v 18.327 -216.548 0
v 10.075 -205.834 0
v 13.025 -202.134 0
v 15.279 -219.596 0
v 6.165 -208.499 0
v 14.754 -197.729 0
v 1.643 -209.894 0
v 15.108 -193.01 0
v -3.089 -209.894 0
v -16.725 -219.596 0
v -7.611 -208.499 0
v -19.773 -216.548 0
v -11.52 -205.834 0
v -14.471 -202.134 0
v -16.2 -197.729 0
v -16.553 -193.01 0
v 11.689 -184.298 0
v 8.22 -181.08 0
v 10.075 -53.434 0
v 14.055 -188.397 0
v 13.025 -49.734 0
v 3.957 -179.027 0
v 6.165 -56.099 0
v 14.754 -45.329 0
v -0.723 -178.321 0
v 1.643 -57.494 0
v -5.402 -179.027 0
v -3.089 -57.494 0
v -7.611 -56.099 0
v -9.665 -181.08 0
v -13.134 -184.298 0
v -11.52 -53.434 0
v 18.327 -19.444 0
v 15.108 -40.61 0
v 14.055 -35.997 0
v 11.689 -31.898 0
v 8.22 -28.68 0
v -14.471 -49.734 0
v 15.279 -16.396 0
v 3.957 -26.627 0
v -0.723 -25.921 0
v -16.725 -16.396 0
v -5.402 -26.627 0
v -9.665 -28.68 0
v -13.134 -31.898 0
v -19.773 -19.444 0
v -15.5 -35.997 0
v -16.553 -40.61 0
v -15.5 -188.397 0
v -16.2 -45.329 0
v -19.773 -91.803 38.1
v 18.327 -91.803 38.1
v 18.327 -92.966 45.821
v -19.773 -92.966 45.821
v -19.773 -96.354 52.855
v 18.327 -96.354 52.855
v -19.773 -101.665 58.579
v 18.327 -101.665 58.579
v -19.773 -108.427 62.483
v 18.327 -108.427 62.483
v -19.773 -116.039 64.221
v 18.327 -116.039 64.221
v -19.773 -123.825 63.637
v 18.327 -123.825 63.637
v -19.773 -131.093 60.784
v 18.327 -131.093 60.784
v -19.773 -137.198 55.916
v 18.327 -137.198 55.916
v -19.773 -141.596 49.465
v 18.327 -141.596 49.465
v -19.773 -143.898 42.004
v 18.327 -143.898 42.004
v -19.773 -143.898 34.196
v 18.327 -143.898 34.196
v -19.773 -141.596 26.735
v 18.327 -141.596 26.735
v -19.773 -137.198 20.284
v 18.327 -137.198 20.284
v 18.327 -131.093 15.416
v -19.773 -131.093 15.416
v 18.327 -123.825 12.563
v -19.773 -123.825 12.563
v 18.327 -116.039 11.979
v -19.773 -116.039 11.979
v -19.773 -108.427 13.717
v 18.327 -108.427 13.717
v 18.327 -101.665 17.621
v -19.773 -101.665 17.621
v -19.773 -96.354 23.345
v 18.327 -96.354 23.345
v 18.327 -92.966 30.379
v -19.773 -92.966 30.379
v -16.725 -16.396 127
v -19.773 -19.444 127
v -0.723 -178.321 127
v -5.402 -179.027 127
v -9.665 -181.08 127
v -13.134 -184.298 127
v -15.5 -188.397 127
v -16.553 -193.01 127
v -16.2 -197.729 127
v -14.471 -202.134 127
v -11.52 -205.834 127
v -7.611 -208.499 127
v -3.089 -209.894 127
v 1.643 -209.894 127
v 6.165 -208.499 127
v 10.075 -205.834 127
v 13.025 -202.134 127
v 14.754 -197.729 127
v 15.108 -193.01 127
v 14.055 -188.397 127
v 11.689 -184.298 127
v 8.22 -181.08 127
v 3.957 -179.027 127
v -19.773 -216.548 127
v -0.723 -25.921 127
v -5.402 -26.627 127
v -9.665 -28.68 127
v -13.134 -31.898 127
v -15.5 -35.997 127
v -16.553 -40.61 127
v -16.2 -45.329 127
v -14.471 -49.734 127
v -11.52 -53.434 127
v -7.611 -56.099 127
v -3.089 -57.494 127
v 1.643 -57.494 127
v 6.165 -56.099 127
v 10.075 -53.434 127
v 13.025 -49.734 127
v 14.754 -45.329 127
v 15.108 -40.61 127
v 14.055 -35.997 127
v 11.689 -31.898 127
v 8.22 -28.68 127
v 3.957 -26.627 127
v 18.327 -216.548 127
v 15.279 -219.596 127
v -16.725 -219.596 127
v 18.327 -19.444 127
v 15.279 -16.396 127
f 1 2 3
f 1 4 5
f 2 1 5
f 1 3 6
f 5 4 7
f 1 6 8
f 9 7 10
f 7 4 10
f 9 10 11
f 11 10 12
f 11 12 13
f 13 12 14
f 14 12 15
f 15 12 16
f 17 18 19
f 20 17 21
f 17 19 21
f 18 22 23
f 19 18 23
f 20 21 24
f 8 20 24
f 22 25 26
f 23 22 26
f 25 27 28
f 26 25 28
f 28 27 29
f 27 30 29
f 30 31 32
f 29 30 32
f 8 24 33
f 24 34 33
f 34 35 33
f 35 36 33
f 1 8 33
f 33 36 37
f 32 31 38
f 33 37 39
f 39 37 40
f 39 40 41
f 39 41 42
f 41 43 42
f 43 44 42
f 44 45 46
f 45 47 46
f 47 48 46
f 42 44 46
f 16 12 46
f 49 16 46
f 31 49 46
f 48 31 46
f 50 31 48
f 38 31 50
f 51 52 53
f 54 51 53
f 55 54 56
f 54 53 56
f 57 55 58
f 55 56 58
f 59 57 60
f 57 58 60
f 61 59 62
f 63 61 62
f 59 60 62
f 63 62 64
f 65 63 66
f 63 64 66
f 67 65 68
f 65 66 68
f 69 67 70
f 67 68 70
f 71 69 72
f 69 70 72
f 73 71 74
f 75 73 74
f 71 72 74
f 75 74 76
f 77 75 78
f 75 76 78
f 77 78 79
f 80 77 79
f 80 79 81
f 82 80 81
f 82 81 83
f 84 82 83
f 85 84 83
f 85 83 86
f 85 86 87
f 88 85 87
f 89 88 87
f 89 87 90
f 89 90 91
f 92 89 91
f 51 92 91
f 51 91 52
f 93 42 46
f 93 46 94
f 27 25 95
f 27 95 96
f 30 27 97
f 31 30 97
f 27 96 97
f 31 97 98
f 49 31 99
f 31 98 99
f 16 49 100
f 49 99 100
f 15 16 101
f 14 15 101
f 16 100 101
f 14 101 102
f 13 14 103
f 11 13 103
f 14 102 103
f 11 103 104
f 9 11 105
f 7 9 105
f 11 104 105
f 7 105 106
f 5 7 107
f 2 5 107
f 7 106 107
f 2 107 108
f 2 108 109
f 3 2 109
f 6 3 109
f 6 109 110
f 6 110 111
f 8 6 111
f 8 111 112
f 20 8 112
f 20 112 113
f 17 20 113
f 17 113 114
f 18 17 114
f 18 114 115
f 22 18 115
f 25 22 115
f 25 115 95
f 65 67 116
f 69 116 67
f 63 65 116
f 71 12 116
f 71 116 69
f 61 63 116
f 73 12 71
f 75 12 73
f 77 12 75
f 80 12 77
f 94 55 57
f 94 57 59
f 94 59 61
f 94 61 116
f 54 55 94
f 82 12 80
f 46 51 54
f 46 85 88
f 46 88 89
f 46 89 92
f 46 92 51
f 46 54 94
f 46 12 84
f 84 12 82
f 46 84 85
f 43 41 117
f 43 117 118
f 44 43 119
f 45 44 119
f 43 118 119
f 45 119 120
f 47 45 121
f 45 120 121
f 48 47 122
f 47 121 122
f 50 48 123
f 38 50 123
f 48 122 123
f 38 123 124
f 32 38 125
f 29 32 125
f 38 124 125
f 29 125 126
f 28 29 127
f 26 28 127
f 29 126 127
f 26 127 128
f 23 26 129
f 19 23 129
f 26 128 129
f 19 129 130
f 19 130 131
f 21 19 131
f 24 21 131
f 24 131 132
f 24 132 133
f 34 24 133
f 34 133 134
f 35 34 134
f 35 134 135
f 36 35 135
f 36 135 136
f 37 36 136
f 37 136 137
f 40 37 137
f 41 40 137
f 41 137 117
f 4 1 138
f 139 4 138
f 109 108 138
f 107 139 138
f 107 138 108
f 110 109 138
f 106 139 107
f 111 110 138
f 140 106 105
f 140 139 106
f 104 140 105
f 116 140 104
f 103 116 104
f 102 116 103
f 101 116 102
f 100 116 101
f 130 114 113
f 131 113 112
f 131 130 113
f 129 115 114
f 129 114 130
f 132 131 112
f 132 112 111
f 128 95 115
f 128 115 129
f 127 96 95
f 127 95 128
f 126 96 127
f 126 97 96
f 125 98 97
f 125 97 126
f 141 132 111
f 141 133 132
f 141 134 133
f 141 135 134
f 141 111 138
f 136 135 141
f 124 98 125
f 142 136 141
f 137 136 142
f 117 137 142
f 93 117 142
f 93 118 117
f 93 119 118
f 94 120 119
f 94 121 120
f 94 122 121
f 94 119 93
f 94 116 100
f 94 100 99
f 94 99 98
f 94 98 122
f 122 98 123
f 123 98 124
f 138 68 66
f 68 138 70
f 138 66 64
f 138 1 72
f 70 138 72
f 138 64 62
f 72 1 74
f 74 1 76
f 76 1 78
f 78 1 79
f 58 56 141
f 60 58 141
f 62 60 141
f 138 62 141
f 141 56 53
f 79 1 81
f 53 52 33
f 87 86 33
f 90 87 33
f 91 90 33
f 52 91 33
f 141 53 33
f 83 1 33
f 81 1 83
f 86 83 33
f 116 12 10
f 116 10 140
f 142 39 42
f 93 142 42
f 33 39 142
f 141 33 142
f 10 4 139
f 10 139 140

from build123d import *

# Parameters (mm, degrees)
F0_W     = 203.2
F0_H     = 38.1
F1_DEPTH = 127
F2_R     = 15.875
F3_DEPTH = 127.001
F4_SIZE  = 3.048
F5_R     = 26.19375
F6_DEPTH = 38.101
F7_ANGLE = 90


with BuildPart() as f1:
    # F0 (on Top) → F1 (new body)
    with BuildSketch(Plane.XY):
        with Locations((-80.2247157872, -0.3943982914)):
            Rectangle(F0_W, F0_H)
    extrude(amount=F1_DEPTH)

    # F2 (on face) → F3 (cut, through all)
    with BuildSketch(Plane.XY.offset(127)):
        with Locations((-156.4247157872, -0.3943982914)):
            Circle(F2_R)
        with Locations((-4.0247157872, -0.3943982914)):
            Circle(F2_R)
    extrude(amount=-F3_DEPTH, mode=Mode.SUBTRACT)

    # F4
    f4_edges = [f1.edges().sort_by_distance(p)[0] for p in [
        (-181.824716, -19.444398, 63.5),
        (21.375284, -19.444398, 63.5),
        (21.375284, 18.655602, 63.5),
        (-181.824716, 18.655602, 63.5),
    ]]
    chamfer(f4_edges, length=F4_SIZE)

    # F5 (on face) → F6 (cut, through all)
    with BuildSketch(Plane.XZ.offset(19.4443982914)):
        with Locations((-80.2247157872, 38.1)):
            Circle(F5_R)
    extrude(amount=-F6_DEPTH, mode=Mode.SUBTRACT)


with BuildPart() as f1_1:
    # F7: moved
    add(f1.part.rotate(Axis((18.3272842128, -19.4443982914, 63.5), (0, 0, 1)), F7_ANGLE))


solid = f1_1.part
